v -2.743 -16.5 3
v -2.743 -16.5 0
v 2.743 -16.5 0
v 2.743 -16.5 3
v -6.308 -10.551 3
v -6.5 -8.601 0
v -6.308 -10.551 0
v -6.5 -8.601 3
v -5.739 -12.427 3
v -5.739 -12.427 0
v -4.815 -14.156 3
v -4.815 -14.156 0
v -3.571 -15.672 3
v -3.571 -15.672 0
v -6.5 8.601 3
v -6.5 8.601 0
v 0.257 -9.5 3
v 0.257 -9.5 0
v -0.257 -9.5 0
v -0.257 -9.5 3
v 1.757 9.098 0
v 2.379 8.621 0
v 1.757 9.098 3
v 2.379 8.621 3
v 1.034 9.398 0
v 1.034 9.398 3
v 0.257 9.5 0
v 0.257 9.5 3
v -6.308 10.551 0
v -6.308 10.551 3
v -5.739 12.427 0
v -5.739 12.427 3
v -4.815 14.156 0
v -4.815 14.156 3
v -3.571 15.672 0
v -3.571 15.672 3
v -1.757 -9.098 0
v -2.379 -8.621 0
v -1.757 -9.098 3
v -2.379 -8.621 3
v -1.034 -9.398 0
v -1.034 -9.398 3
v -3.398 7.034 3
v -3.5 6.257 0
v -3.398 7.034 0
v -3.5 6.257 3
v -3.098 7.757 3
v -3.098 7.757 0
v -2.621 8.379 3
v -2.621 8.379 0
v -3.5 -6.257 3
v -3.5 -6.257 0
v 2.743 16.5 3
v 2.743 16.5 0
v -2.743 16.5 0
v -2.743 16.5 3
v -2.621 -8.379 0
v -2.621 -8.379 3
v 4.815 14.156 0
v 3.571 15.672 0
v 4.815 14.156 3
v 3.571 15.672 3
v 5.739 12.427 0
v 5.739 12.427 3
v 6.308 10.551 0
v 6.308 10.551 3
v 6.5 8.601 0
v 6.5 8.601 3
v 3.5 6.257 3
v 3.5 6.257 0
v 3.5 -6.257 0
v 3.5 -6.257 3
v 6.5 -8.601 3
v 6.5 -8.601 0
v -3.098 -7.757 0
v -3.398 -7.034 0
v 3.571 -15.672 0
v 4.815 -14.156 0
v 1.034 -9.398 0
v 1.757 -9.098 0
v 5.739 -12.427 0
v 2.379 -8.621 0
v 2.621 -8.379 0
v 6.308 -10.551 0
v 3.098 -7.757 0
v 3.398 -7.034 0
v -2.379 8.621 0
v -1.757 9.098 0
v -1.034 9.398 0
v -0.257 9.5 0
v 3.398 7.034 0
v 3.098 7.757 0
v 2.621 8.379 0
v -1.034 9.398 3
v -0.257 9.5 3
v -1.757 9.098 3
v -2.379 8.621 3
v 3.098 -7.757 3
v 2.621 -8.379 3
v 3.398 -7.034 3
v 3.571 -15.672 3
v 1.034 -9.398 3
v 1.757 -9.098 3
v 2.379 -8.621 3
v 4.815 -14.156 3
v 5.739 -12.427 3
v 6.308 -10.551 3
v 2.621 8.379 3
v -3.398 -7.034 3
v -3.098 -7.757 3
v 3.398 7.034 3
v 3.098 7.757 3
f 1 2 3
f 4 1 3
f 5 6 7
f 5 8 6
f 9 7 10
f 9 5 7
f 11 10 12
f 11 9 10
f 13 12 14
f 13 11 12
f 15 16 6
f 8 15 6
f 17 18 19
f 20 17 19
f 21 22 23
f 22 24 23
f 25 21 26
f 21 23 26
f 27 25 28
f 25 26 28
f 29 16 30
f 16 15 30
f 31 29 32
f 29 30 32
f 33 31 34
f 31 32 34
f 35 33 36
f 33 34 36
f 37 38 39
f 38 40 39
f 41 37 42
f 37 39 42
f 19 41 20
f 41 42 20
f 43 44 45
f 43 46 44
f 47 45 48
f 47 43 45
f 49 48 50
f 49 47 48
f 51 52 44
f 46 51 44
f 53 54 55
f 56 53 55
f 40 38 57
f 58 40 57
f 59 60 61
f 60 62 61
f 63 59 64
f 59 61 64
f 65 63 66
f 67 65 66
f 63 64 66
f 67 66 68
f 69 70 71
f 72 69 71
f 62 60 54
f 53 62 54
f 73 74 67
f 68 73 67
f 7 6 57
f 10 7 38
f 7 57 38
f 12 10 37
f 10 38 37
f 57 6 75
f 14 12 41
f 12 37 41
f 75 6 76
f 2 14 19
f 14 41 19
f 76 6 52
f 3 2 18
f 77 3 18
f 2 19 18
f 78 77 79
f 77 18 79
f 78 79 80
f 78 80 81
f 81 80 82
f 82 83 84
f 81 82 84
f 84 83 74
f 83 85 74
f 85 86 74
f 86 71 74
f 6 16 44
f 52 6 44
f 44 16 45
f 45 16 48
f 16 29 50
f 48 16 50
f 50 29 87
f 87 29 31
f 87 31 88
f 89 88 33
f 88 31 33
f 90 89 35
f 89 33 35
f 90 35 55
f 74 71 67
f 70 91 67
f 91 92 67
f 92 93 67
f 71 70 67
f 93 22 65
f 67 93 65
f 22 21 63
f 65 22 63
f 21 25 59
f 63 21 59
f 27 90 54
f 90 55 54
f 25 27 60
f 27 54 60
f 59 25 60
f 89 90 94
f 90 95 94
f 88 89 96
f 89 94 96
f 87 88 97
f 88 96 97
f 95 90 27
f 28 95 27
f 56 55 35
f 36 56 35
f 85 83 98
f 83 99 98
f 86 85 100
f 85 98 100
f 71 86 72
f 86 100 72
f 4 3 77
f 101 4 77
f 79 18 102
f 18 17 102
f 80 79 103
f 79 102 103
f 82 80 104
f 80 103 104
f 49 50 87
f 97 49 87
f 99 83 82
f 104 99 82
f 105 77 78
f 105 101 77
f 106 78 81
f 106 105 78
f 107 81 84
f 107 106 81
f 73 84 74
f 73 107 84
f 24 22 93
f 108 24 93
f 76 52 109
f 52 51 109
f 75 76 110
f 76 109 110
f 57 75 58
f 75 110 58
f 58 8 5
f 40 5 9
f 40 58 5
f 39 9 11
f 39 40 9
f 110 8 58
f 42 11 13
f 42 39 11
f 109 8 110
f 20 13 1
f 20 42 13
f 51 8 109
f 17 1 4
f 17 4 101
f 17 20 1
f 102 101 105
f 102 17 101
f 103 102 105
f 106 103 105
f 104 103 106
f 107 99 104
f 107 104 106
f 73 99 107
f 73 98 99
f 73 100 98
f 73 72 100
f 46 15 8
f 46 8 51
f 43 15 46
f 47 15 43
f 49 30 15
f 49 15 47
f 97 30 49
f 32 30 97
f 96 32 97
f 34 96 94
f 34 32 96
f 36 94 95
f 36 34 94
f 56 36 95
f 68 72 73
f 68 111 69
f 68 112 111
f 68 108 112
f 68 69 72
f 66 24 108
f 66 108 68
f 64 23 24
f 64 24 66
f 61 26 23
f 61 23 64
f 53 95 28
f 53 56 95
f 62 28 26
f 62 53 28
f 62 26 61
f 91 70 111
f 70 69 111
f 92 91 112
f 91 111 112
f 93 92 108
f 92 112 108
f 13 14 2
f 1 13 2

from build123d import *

# Parameters (mm, degrees)
F1_DEPTH = 3
F2_R     = 3
F3_R     = 10


with BuildPart() as f1:
    # F0 (on Top) → F1 (new body)
    with BuildSketch(Plane.XY):
        Polygon((-6.5, 12.742641), (-6.5, 8.742641), (-6.5, -8.742641), (-6.5, -12.742641), (-2.742641, -16.5), (0, -16.5), (2.742641, -16.5), (6.5, -12.742641), (6.5, -8.742641), (6.5, 8.742641), (6.5, 12.742641), (2.742641, 16.5), (0, 16.5), (-2.742641, 16.5), align=None)
        Polygon((-3.5, 7.5), (-1.5, 9.5), (1.5, 9.5), (3.5, 7.5), (3.5, -7.5), (1.5, -9.5), (-1.5, -9.5), (-3.5, -7.5), align=None, mode=Mode.SUBTRACT)
    extrude(amount=F1_DEPTH)

    # F2
    f2_edges = [f1.edges().sort_by_distance(p)[0] for p in [
        (-3.5, 7.5, 1.5),
        (3.5, 7.5, 1.5),
        (3.5, -7.5, 1.5),
        (-3.5, -7.5, 1.5),
        (-1.5, 9.5, 1.5),
        (1.5, 9.5, 1.5),
        (1.5, -9.5, 1.5),
        (-1.5, -9.5, 1.5),
    ]]
    fillet(f2_edges, radius=F2_R)

    # F3
    f3_edges = [f1.edges().sort_by_distance(p)[0] for p in [
        (-6.5, 12.742641, 1.5),
        (6.5, 12.742641, 1.5),
        (6.5, -12.742641, 1.5),
        (-6.5, -12.742641, 1.5),
    ]]
    fillet(f3_edges, radius=F3_R)


solid = f1.part
